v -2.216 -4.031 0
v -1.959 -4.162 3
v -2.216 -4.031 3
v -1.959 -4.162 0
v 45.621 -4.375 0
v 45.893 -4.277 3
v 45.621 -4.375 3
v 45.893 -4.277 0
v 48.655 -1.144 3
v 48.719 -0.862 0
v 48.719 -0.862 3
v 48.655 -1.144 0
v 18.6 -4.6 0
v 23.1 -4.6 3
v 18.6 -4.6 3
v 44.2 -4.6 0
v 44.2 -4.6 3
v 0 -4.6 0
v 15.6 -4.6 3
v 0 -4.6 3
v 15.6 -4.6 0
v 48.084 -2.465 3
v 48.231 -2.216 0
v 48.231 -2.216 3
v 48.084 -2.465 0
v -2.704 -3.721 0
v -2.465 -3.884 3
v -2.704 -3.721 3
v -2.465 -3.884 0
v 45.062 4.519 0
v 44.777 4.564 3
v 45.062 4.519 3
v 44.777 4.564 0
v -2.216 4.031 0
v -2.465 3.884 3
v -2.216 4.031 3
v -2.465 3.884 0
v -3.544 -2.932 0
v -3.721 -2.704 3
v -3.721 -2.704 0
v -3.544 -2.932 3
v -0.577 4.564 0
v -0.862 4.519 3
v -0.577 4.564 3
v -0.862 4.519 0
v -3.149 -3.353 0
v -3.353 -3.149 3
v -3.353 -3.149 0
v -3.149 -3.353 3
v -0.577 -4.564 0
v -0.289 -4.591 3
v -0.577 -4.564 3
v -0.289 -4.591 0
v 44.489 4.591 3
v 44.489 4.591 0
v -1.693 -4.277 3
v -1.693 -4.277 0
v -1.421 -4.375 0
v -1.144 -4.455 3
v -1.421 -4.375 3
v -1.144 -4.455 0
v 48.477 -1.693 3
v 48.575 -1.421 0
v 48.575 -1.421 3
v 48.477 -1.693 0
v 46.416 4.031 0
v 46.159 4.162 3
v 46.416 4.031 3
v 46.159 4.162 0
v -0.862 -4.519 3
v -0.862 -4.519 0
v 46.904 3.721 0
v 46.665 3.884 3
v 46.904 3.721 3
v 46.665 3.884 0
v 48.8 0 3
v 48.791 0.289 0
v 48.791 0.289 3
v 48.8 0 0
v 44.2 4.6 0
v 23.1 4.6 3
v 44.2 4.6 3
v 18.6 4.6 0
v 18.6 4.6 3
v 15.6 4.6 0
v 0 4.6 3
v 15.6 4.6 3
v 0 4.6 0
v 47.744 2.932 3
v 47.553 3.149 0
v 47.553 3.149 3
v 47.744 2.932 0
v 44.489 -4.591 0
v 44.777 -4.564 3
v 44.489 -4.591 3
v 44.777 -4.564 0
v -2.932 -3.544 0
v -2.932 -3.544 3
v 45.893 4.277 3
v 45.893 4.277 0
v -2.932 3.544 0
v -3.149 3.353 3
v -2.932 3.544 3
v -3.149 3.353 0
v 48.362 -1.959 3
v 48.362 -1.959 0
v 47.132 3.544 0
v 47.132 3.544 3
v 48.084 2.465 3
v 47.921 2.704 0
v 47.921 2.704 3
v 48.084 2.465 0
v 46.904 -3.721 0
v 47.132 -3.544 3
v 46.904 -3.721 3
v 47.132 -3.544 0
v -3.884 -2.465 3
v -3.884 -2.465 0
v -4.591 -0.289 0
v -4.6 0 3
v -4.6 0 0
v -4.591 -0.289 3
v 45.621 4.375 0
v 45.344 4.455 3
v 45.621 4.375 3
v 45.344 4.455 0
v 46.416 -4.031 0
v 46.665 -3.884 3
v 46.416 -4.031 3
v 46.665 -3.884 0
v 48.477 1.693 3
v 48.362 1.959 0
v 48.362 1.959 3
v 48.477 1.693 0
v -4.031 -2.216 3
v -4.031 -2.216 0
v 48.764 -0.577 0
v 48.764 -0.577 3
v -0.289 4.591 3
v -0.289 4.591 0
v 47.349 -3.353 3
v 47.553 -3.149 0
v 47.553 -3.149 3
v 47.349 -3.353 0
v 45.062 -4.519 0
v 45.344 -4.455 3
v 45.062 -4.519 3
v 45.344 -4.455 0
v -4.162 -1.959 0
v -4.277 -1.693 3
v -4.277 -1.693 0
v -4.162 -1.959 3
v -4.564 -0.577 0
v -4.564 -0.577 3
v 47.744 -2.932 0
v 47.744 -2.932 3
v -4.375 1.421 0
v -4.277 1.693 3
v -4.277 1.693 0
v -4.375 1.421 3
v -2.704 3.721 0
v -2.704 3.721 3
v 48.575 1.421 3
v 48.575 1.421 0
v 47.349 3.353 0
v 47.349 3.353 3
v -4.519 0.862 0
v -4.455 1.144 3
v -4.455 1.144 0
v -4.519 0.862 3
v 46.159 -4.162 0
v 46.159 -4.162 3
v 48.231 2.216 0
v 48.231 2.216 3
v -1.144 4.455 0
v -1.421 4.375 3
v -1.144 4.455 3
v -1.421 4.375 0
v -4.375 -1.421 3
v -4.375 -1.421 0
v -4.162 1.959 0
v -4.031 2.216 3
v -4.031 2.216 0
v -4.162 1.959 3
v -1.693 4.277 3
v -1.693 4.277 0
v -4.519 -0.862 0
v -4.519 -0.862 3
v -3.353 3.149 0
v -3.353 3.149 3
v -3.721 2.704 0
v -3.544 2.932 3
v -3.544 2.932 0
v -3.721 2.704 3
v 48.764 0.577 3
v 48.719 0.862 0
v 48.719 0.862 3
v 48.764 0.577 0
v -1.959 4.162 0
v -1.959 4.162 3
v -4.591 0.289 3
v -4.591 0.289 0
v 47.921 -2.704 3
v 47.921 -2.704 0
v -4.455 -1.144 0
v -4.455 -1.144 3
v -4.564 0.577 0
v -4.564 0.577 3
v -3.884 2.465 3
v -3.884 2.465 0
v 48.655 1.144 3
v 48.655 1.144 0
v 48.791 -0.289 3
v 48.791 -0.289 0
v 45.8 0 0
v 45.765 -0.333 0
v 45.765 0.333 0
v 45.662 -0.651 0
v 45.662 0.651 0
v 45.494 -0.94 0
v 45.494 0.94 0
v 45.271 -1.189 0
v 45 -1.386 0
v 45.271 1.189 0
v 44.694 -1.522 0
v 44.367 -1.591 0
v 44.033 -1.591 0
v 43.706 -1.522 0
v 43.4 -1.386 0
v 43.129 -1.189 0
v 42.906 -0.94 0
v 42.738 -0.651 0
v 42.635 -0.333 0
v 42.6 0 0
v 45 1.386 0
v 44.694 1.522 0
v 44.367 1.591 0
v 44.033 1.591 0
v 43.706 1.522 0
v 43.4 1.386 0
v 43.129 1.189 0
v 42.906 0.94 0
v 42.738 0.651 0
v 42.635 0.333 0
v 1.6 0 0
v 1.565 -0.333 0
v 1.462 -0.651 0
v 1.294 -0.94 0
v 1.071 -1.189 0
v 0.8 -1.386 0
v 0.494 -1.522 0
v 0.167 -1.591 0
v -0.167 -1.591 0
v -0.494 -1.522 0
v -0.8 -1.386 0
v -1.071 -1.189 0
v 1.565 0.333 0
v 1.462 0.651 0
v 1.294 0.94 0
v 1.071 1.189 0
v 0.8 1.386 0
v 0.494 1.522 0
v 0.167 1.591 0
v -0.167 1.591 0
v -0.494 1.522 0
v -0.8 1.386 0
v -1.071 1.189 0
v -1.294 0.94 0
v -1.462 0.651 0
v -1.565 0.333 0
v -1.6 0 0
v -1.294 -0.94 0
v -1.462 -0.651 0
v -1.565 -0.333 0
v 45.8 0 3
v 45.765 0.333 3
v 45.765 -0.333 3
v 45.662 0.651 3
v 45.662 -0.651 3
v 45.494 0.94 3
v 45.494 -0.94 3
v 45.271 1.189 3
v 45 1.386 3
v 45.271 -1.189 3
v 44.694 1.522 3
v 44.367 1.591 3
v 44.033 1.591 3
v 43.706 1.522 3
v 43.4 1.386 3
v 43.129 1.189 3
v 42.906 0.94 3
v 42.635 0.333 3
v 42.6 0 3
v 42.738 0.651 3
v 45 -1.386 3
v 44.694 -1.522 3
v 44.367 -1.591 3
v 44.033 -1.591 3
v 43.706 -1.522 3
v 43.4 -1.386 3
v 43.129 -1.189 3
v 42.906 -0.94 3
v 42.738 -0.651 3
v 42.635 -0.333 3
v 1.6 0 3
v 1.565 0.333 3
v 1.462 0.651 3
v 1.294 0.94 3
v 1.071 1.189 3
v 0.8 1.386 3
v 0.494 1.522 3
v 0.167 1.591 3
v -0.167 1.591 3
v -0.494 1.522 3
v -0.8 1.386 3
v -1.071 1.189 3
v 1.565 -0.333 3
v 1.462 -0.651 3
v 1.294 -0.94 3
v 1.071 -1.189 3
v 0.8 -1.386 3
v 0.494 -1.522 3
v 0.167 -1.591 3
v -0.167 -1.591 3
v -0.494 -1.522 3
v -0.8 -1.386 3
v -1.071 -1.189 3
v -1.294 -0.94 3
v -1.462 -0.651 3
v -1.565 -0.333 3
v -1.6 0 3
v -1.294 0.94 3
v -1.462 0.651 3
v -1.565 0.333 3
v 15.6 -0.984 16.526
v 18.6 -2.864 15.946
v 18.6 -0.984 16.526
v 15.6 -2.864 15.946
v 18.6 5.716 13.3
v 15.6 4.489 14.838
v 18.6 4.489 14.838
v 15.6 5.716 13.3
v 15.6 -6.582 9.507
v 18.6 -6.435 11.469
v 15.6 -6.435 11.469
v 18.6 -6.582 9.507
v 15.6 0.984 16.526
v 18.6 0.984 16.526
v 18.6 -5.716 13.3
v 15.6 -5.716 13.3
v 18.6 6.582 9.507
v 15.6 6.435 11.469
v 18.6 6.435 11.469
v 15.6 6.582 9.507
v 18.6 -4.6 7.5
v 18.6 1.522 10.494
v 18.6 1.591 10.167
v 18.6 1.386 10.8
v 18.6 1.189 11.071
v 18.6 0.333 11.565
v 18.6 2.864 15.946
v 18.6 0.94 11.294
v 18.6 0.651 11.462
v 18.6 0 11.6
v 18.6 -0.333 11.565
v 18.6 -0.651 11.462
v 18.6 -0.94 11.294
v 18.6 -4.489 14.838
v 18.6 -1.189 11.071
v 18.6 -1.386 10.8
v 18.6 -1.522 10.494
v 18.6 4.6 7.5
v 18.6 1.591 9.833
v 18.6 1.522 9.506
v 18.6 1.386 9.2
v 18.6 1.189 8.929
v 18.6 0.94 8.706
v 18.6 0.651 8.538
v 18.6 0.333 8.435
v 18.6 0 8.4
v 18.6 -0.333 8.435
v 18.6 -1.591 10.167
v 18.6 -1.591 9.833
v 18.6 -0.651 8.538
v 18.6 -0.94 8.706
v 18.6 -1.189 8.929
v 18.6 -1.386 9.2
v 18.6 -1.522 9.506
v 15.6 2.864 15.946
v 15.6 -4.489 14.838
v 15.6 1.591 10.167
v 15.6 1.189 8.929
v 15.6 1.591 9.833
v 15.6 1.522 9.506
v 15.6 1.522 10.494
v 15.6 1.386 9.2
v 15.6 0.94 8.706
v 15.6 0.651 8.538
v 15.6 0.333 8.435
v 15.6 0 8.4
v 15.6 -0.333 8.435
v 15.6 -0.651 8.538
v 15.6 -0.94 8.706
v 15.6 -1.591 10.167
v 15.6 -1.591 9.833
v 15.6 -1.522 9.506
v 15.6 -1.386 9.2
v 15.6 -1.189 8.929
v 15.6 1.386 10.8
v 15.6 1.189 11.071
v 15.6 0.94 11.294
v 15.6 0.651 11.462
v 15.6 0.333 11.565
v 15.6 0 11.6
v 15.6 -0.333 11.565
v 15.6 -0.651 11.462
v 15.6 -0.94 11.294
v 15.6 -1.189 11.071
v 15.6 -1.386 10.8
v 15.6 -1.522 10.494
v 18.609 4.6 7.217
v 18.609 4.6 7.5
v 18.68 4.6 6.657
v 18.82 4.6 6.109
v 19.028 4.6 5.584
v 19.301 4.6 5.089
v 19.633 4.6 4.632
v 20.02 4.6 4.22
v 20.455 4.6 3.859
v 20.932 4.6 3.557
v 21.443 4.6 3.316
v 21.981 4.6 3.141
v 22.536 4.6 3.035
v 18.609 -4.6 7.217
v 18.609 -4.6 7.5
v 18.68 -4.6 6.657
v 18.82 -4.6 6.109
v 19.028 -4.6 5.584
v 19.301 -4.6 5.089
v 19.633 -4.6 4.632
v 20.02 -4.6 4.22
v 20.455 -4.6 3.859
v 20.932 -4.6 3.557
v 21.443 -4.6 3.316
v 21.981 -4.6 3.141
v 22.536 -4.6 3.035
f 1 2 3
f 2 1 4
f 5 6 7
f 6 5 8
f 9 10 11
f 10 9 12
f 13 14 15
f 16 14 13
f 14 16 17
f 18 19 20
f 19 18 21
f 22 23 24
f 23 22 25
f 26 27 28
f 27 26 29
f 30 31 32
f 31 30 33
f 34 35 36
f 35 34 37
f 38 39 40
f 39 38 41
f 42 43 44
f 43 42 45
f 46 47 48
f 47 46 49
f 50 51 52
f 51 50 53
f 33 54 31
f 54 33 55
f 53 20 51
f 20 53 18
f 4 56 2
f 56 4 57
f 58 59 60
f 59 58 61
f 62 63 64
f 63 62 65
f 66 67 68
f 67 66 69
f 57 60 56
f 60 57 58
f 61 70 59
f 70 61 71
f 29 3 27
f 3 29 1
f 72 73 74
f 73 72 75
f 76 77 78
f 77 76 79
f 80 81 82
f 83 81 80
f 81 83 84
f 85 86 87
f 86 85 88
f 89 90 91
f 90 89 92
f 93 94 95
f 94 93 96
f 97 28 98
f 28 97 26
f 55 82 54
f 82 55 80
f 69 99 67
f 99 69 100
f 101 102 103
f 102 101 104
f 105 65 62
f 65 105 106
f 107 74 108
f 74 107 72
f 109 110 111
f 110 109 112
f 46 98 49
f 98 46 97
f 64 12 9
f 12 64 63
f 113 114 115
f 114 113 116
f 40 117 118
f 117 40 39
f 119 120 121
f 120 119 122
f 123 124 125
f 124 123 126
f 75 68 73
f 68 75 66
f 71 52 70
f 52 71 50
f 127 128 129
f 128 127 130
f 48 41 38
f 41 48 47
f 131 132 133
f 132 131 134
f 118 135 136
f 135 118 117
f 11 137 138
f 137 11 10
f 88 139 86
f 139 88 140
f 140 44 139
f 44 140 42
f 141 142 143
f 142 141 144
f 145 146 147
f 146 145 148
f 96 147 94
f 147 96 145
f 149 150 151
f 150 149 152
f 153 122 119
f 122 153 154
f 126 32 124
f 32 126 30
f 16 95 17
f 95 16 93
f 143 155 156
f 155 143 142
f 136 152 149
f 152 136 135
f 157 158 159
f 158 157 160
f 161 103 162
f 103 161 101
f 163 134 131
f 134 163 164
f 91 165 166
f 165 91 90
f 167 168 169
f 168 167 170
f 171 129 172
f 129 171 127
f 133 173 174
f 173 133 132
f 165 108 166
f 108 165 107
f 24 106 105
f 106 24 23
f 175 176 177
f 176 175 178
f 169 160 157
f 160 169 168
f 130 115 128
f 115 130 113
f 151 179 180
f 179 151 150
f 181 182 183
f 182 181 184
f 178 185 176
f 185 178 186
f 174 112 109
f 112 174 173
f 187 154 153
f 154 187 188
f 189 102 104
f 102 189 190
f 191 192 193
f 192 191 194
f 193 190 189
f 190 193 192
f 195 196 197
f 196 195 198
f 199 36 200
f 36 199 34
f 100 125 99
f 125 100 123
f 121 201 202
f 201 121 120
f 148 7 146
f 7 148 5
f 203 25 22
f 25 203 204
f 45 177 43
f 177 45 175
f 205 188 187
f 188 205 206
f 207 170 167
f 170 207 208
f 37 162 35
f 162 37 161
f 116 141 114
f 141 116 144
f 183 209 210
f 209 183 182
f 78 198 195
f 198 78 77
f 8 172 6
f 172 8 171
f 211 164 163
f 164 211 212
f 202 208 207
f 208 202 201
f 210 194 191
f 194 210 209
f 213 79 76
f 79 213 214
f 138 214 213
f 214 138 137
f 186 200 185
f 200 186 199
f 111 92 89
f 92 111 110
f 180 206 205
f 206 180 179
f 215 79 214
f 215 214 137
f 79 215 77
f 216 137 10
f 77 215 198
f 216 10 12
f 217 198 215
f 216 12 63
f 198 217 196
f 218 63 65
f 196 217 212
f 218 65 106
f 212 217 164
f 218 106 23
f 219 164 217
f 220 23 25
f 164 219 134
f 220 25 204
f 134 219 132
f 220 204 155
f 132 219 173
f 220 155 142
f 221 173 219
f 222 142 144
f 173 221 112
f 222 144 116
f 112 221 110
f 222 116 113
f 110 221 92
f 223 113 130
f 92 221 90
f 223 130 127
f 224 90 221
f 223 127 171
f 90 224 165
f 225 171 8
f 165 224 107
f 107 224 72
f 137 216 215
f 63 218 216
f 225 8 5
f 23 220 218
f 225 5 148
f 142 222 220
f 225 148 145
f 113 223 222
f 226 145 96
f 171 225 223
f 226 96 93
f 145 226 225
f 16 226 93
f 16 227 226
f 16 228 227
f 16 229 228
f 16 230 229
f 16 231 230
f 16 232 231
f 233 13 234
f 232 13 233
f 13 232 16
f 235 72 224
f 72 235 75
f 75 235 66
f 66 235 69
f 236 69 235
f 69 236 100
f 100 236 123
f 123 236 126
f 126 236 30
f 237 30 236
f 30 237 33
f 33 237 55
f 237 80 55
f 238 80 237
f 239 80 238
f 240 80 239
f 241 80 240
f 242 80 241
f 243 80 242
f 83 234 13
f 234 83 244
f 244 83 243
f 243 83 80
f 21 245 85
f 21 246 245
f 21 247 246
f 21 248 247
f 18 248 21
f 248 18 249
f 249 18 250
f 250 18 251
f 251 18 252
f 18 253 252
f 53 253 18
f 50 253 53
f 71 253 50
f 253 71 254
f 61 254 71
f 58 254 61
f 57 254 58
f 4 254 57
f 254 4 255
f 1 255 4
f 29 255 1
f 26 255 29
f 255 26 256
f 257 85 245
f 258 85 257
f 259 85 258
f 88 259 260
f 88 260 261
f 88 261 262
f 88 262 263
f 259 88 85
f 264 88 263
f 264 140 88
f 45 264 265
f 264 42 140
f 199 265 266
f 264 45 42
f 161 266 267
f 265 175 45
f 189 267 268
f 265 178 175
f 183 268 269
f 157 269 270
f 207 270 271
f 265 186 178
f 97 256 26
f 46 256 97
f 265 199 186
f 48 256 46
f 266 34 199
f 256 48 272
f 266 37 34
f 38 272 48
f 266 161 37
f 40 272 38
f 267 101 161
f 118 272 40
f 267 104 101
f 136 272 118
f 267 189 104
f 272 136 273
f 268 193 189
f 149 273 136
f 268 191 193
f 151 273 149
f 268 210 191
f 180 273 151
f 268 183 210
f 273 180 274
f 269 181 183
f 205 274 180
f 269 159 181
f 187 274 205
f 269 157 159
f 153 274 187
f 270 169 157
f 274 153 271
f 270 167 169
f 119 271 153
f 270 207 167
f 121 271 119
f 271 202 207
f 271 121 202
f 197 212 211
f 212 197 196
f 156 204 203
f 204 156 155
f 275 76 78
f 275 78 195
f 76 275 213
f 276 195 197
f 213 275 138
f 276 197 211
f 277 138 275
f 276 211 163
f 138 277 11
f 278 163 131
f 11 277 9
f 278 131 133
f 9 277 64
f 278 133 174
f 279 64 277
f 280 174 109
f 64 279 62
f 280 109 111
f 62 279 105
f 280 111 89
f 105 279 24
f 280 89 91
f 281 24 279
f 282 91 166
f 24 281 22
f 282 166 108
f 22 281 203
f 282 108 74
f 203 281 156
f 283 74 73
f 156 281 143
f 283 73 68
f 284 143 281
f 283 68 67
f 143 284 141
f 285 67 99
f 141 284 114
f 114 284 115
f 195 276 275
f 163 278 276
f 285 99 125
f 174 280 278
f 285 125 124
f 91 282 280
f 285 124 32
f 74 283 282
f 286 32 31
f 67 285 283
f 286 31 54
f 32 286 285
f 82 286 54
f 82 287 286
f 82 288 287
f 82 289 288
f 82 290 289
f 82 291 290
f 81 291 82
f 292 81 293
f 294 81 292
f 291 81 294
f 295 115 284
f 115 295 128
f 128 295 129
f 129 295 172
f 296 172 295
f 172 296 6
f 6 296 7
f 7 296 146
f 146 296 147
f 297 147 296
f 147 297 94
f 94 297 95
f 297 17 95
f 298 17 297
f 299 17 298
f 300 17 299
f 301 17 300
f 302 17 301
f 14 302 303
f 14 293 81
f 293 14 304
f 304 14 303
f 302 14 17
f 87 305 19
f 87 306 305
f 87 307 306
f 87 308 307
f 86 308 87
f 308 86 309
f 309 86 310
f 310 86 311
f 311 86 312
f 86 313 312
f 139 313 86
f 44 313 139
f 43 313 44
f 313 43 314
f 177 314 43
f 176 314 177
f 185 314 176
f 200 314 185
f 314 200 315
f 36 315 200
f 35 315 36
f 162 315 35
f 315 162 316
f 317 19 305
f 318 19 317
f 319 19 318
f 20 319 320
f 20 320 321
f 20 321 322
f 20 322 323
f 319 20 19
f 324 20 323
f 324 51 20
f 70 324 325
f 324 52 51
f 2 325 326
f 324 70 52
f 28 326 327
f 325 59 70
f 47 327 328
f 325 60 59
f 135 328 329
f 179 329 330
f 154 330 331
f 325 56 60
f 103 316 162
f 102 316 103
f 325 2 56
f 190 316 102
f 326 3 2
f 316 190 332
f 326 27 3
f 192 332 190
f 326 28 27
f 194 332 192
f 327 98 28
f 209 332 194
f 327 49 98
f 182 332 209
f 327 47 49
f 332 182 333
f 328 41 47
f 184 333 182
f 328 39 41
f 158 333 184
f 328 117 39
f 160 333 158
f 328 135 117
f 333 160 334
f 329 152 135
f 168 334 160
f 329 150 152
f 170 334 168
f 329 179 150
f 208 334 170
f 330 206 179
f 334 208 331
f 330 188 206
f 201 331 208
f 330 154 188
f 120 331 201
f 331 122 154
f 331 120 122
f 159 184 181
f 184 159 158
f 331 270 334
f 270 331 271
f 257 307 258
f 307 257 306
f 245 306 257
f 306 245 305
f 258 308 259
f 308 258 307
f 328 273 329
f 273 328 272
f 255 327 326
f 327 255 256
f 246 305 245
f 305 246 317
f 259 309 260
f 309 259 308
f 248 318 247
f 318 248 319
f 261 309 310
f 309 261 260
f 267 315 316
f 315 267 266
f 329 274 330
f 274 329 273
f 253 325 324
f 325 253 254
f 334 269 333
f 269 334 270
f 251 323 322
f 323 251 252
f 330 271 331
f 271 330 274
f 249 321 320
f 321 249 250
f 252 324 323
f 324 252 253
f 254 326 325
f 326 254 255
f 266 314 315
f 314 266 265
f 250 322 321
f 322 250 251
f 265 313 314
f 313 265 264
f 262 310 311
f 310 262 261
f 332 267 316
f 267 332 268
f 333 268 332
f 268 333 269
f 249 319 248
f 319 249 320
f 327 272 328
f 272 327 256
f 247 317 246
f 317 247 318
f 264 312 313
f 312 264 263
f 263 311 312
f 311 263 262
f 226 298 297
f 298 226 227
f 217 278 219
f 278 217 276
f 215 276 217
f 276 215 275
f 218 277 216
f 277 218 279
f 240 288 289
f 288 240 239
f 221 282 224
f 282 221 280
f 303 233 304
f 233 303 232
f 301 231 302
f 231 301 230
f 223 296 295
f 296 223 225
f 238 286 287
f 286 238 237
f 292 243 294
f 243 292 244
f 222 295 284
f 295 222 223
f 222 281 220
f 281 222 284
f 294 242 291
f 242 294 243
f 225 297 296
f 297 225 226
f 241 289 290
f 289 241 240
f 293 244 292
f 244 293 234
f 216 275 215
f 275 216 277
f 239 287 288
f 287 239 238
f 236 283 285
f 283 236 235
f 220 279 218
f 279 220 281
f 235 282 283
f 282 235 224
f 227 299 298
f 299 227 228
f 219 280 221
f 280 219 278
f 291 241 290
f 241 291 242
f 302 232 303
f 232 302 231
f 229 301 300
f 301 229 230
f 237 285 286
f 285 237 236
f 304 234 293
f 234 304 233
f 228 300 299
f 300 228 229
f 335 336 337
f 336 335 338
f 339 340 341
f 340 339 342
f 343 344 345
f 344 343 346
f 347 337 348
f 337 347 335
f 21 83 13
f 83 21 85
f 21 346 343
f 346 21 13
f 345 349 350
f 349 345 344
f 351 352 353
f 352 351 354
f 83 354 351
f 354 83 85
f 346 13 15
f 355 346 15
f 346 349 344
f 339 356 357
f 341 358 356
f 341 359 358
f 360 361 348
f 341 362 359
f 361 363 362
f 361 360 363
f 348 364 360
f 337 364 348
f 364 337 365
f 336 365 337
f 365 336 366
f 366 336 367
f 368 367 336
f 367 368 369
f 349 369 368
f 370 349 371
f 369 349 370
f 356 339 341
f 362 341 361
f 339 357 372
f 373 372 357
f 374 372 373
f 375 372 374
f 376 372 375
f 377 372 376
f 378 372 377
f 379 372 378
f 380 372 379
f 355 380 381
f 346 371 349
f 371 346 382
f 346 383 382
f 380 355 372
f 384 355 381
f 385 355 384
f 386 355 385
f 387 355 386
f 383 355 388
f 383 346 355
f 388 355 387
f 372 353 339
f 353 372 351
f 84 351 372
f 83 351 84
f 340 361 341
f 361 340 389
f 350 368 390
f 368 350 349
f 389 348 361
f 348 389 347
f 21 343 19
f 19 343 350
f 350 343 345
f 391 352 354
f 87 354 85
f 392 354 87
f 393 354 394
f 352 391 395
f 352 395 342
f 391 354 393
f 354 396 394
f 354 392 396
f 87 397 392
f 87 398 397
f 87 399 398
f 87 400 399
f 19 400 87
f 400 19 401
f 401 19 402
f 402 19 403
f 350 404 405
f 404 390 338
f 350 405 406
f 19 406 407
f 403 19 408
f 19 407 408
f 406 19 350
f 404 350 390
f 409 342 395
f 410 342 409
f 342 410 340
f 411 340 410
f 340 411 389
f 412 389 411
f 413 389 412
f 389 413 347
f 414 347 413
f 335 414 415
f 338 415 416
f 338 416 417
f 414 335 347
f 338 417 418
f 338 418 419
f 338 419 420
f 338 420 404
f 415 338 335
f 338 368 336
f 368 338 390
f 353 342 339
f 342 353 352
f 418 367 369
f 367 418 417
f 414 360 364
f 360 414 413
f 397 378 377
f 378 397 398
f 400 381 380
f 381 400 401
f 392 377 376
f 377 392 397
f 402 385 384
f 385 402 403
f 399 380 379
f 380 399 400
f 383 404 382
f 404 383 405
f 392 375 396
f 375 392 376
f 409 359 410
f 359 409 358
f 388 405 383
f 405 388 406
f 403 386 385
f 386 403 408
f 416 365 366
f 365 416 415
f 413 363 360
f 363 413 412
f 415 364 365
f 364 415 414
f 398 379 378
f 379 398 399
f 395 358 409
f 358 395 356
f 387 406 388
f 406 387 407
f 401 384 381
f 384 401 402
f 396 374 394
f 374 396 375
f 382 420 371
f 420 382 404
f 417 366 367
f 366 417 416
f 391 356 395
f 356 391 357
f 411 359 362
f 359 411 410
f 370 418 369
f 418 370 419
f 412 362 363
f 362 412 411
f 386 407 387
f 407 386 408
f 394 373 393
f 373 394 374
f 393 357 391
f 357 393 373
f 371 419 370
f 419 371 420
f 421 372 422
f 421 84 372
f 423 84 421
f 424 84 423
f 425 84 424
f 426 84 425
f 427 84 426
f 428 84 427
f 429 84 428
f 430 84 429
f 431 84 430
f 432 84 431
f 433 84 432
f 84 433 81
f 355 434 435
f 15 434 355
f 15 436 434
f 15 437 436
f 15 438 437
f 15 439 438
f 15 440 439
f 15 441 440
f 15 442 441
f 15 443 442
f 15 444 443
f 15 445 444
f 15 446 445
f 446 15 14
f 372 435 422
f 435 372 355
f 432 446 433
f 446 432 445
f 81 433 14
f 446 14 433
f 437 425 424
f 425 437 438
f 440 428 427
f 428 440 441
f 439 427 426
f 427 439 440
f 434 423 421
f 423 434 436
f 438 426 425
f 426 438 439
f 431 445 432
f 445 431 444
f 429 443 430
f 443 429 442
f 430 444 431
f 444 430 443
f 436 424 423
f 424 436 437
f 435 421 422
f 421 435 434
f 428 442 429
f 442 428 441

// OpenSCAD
screw_r = 3.2/2;
th = 3;
outer_r = screw_r + th;
dst = 44.2;

module s() { cylinder(r=screw_r, h=100, center=true, $fn=30); }

module base() {
    difference() {
        hull() {
            cylinder(r=outer_r, h=th, $fn=100);
            translate([dst,0,0])
            cylinder(r=outer_r, h=th, $fn=100);
        }
        
        s();
        translate([dst,0,0]) s();
    }
}

base();




module reinforcement(size, r) {
    translate([r,-outer_r,r])
    rotate([0,90,90])
    difference() {
        cube([r,r,size]);
        cylinder(r = r, h = size, $fn=50);
    }
}


module up() {
   updst = 7+th;
    difference() {
        
        hull() {
            translate([0,0,updst])
            rotate([0,90,0])
            cylinder(r=outer_r+2, h=th, center=true);
                    
            cube([th, 2*outer_r, 0.00001], center=true);
        }
        translate([0,0,updst])
        rotate([0,90,0])
        s();
    }
    
    translate([th/2,0,th])
    reinforcement(size=outer_r*2, r = 4.5);
}

translate([dst/2-5,0,0])
up();
